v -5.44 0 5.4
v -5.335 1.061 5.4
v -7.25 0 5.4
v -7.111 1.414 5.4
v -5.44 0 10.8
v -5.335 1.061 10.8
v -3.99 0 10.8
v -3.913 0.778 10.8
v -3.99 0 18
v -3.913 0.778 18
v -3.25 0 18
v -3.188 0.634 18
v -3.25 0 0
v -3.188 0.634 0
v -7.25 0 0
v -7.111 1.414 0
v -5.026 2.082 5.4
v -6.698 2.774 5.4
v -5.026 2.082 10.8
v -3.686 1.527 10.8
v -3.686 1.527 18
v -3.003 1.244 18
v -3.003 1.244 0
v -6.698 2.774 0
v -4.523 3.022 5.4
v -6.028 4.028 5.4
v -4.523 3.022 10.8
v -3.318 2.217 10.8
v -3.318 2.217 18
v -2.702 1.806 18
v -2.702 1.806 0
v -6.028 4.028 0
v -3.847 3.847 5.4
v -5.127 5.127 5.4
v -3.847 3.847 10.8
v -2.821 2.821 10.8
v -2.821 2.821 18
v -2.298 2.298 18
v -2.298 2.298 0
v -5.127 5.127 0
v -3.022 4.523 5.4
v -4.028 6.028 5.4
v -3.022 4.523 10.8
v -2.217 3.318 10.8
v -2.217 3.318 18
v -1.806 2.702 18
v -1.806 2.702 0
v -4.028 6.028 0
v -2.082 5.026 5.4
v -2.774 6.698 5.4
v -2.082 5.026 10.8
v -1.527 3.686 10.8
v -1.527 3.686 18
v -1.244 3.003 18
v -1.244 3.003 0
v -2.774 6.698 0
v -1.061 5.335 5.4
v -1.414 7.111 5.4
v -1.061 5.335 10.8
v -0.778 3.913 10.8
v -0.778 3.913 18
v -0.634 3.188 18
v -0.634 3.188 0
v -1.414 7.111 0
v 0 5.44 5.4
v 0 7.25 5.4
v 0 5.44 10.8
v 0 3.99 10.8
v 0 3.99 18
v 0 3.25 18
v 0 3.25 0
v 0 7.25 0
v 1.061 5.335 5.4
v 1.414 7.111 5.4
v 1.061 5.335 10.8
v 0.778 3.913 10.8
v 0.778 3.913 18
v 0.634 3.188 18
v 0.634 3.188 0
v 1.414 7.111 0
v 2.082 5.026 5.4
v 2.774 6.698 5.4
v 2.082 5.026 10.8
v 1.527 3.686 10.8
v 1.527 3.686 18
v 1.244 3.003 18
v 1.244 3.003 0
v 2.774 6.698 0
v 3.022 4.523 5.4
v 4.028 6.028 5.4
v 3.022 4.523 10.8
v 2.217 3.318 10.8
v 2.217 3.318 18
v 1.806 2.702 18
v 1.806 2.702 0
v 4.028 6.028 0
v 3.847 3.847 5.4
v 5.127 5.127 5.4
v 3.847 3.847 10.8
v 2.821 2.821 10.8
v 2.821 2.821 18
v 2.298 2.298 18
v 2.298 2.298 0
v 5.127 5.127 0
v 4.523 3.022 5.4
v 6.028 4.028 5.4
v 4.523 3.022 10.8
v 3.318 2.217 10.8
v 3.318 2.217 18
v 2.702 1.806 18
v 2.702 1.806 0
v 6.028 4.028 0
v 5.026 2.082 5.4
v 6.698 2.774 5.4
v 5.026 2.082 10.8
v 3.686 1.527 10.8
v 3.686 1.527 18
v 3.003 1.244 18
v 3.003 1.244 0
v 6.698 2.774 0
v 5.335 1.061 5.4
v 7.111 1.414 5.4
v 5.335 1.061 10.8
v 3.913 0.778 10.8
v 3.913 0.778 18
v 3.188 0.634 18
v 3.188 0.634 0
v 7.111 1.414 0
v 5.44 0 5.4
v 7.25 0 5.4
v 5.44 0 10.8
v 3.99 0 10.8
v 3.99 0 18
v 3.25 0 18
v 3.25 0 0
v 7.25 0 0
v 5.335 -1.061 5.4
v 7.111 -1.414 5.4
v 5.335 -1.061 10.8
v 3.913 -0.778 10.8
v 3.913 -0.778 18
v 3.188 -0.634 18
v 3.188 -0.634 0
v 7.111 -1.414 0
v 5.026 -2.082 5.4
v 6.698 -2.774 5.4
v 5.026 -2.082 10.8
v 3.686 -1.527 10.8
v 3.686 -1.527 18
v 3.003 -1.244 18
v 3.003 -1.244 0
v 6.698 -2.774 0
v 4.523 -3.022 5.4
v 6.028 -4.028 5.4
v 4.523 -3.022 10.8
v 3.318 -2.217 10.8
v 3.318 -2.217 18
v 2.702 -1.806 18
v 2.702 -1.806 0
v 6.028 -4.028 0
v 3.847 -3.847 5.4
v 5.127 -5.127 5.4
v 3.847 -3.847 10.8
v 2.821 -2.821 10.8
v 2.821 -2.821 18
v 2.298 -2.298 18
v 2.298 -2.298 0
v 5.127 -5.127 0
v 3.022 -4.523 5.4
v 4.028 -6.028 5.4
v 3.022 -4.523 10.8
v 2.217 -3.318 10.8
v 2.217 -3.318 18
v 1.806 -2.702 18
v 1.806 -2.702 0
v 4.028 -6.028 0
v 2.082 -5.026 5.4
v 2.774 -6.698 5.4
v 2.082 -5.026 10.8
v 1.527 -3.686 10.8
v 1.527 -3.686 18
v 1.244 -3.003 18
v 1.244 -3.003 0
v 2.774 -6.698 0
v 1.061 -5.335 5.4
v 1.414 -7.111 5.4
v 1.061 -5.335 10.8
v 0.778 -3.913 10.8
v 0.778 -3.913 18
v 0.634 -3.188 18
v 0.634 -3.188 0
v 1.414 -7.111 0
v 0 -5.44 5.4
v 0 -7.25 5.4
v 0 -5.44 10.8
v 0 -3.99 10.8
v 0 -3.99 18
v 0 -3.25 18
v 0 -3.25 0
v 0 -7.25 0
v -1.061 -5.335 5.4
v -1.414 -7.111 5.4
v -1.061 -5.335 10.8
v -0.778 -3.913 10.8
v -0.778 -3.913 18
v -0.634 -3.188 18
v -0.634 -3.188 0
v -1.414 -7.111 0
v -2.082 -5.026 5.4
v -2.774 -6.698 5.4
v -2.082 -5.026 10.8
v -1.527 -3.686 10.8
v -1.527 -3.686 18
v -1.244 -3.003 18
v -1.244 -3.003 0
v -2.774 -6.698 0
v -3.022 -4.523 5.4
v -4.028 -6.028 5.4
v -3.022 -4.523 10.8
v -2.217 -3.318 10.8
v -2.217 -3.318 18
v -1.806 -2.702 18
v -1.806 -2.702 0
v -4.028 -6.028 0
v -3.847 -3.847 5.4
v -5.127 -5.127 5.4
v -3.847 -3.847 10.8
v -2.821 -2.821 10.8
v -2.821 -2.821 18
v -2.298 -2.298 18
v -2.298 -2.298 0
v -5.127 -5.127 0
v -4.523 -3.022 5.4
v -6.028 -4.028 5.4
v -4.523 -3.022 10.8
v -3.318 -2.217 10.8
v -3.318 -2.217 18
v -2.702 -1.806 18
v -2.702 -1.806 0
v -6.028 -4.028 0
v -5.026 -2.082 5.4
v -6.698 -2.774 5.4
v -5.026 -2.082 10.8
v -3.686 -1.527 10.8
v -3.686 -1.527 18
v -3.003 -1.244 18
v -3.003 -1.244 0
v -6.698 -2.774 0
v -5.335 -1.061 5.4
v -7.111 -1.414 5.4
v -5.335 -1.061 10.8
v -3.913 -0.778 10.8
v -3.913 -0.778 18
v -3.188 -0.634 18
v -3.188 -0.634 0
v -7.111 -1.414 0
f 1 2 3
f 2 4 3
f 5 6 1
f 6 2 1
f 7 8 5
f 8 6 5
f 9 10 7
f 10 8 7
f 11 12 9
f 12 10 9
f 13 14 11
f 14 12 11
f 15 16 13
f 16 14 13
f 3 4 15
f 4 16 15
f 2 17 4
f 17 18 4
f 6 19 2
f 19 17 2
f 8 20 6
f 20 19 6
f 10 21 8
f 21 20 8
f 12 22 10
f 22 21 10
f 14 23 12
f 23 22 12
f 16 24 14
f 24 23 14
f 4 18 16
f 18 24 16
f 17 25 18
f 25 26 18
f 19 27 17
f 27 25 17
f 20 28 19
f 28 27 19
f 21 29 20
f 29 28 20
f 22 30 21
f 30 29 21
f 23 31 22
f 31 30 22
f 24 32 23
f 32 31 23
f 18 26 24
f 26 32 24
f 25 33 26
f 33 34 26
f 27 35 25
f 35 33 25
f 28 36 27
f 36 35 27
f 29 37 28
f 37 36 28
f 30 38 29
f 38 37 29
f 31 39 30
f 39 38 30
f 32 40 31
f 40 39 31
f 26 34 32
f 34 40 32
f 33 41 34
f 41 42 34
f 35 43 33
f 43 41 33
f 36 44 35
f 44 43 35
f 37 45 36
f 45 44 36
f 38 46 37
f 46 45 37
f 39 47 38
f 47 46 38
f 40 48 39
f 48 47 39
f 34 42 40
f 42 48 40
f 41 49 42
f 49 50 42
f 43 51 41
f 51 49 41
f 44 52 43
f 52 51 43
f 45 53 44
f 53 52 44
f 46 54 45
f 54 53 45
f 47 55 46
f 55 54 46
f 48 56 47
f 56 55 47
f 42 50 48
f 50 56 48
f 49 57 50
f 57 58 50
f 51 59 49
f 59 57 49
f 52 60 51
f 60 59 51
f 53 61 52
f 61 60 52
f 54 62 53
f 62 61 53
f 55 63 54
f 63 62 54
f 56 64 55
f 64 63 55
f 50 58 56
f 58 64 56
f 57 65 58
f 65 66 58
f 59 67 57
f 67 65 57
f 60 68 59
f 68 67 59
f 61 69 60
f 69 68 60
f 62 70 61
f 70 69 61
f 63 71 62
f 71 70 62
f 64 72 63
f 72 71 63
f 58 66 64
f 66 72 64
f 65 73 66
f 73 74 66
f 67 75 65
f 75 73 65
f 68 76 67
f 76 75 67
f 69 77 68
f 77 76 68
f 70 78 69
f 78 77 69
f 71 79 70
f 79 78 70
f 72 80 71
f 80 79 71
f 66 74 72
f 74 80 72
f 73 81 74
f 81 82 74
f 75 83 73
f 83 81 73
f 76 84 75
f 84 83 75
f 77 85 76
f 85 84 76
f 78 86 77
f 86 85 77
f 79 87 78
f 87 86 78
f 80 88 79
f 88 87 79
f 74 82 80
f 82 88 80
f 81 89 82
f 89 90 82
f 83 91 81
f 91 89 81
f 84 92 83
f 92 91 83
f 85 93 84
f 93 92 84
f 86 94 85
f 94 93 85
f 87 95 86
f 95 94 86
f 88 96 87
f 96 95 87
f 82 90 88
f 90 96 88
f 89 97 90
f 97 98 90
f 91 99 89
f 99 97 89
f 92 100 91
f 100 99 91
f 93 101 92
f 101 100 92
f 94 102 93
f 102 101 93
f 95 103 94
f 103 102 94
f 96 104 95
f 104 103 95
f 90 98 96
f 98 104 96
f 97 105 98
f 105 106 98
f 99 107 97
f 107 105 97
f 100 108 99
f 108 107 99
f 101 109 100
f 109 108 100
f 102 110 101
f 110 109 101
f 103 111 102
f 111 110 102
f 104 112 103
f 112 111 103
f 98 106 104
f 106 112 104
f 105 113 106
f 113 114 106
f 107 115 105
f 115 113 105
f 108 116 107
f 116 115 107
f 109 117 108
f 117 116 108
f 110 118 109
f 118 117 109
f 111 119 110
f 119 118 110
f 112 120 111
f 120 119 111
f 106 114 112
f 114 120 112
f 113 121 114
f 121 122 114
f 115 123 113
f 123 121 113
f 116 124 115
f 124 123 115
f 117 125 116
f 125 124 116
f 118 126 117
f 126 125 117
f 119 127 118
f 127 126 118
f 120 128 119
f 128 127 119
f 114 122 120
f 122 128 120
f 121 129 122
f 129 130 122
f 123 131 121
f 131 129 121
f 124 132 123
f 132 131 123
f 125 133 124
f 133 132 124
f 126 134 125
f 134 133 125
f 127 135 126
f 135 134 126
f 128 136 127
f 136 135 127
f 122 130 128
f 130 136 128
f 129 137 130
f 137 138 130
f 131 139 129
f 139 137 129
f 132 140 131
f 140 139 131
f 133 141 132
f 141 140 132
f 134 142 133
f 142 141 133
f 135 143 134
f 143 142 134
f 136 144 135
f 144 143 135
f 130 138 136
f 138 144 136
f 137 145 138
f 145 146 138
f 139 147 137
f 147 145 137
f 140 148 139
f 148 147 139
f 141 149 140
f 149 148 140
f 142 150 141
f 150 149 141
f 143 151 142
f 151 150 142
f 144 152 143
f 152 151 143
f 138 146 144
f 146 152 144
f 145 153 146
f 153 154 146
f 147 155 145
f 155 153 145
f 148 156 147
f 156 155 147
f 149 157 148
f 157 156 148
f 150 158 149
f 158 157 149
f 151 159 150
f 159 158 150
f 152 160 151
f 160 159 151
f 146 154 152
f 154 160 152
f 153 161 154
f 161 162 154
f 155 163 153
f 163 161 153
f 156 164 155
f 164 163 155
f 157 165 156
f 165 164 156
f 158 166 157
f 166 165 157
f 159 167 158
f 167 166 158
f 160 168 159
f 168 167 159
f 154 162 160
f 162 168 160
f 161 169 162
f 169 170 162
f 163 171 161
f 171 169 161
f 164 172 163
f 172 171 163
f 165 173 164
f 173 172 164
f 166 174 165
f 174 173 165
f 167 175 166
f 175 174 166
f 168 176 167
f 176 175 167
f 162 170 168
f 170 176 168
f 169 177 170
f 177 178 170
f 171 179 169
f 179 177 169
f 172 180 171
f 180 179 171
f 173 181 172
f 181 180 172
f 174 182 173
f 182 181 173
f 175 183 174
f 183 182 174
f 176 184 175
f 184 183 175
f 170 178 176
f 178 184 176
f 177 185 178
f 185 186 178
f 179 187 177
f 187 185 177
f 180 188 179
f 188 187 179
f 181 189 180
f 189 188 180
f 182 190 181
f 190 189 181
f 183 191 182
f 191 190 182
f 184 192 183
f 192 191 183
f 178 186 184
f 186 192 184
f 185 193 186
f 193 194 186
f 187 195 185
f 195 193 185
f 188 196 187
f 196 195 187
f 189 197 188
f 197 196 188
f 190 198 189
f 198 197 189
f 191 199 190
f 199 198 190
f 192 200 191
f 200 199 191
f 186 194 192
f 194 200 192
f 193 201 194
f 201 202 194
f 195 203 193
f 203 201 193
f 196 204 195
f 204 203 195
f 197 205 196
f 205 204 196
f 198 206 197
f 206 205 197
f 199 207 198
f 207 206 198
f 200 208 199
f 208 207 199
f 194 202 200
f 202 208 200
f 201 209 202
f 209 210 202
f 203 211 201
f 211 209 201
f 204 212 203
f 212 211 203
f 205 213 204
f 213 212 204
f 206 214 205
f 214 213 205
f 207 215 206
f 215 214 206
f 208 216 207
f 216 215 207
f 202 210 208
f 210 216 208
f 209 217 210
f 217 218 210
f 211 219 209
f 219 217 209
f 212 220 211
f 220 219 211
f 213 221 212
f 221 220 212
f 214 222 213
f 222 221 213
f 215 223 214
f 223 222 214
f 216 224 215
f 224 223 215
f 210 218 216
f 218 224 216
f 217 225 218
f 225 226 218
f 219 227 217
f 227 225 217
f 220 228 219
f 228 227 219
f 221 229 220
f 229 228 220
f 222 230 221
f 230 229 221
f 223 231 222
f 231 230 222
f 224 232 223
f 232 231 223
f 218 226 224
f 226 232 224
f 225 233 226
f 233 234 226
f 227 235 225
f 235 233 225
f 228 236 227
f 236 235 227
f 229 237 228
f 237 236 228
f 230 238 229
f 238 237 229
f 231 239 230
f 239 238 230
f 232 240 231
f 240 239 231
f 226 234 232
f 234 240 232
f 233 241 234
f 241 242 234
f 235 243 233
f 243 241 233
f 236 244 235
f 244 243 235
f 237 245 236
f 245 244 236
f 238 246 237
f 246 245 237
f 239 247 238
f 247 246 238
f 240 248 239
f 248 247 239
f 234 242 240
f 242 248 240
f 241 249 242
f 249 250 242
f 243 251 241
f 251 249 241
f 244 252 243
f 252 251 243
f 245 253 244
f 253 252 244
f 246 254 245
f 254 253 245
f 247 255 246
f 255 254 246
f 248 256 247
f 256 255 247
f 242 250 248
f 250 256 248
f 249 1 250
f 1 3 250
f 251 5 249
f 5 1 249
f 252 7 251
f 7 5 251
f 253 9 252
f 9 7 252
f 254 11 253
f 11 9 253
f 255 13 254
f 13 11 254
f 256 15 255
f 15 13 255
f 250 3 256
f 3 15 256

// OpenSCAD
$fn = 32;

// ----------------------------------------------------------------------
// Profiled standoff: stepped spacer, 18 mm long, bore 6.5 mm
// ----------------------------------------------------------------------

// --- parameters (mm) ---
revolve_angle = 360;      // full turn around the Z axis
profile_points = 8;       // points of the closed outline

profile = [[3.25, 0], [7.25, 0], [7.25, 5.4], [5.44, 5.4], [5.44, 10.8], [3.99, 10.8], [3.99, 18], [3.25, 18]];  // single closed polygon, 8 points, counter clockwise

// --- the one profile operation ---
rotate_extrude(angle = revolve_angle) polygon(points = profile);
